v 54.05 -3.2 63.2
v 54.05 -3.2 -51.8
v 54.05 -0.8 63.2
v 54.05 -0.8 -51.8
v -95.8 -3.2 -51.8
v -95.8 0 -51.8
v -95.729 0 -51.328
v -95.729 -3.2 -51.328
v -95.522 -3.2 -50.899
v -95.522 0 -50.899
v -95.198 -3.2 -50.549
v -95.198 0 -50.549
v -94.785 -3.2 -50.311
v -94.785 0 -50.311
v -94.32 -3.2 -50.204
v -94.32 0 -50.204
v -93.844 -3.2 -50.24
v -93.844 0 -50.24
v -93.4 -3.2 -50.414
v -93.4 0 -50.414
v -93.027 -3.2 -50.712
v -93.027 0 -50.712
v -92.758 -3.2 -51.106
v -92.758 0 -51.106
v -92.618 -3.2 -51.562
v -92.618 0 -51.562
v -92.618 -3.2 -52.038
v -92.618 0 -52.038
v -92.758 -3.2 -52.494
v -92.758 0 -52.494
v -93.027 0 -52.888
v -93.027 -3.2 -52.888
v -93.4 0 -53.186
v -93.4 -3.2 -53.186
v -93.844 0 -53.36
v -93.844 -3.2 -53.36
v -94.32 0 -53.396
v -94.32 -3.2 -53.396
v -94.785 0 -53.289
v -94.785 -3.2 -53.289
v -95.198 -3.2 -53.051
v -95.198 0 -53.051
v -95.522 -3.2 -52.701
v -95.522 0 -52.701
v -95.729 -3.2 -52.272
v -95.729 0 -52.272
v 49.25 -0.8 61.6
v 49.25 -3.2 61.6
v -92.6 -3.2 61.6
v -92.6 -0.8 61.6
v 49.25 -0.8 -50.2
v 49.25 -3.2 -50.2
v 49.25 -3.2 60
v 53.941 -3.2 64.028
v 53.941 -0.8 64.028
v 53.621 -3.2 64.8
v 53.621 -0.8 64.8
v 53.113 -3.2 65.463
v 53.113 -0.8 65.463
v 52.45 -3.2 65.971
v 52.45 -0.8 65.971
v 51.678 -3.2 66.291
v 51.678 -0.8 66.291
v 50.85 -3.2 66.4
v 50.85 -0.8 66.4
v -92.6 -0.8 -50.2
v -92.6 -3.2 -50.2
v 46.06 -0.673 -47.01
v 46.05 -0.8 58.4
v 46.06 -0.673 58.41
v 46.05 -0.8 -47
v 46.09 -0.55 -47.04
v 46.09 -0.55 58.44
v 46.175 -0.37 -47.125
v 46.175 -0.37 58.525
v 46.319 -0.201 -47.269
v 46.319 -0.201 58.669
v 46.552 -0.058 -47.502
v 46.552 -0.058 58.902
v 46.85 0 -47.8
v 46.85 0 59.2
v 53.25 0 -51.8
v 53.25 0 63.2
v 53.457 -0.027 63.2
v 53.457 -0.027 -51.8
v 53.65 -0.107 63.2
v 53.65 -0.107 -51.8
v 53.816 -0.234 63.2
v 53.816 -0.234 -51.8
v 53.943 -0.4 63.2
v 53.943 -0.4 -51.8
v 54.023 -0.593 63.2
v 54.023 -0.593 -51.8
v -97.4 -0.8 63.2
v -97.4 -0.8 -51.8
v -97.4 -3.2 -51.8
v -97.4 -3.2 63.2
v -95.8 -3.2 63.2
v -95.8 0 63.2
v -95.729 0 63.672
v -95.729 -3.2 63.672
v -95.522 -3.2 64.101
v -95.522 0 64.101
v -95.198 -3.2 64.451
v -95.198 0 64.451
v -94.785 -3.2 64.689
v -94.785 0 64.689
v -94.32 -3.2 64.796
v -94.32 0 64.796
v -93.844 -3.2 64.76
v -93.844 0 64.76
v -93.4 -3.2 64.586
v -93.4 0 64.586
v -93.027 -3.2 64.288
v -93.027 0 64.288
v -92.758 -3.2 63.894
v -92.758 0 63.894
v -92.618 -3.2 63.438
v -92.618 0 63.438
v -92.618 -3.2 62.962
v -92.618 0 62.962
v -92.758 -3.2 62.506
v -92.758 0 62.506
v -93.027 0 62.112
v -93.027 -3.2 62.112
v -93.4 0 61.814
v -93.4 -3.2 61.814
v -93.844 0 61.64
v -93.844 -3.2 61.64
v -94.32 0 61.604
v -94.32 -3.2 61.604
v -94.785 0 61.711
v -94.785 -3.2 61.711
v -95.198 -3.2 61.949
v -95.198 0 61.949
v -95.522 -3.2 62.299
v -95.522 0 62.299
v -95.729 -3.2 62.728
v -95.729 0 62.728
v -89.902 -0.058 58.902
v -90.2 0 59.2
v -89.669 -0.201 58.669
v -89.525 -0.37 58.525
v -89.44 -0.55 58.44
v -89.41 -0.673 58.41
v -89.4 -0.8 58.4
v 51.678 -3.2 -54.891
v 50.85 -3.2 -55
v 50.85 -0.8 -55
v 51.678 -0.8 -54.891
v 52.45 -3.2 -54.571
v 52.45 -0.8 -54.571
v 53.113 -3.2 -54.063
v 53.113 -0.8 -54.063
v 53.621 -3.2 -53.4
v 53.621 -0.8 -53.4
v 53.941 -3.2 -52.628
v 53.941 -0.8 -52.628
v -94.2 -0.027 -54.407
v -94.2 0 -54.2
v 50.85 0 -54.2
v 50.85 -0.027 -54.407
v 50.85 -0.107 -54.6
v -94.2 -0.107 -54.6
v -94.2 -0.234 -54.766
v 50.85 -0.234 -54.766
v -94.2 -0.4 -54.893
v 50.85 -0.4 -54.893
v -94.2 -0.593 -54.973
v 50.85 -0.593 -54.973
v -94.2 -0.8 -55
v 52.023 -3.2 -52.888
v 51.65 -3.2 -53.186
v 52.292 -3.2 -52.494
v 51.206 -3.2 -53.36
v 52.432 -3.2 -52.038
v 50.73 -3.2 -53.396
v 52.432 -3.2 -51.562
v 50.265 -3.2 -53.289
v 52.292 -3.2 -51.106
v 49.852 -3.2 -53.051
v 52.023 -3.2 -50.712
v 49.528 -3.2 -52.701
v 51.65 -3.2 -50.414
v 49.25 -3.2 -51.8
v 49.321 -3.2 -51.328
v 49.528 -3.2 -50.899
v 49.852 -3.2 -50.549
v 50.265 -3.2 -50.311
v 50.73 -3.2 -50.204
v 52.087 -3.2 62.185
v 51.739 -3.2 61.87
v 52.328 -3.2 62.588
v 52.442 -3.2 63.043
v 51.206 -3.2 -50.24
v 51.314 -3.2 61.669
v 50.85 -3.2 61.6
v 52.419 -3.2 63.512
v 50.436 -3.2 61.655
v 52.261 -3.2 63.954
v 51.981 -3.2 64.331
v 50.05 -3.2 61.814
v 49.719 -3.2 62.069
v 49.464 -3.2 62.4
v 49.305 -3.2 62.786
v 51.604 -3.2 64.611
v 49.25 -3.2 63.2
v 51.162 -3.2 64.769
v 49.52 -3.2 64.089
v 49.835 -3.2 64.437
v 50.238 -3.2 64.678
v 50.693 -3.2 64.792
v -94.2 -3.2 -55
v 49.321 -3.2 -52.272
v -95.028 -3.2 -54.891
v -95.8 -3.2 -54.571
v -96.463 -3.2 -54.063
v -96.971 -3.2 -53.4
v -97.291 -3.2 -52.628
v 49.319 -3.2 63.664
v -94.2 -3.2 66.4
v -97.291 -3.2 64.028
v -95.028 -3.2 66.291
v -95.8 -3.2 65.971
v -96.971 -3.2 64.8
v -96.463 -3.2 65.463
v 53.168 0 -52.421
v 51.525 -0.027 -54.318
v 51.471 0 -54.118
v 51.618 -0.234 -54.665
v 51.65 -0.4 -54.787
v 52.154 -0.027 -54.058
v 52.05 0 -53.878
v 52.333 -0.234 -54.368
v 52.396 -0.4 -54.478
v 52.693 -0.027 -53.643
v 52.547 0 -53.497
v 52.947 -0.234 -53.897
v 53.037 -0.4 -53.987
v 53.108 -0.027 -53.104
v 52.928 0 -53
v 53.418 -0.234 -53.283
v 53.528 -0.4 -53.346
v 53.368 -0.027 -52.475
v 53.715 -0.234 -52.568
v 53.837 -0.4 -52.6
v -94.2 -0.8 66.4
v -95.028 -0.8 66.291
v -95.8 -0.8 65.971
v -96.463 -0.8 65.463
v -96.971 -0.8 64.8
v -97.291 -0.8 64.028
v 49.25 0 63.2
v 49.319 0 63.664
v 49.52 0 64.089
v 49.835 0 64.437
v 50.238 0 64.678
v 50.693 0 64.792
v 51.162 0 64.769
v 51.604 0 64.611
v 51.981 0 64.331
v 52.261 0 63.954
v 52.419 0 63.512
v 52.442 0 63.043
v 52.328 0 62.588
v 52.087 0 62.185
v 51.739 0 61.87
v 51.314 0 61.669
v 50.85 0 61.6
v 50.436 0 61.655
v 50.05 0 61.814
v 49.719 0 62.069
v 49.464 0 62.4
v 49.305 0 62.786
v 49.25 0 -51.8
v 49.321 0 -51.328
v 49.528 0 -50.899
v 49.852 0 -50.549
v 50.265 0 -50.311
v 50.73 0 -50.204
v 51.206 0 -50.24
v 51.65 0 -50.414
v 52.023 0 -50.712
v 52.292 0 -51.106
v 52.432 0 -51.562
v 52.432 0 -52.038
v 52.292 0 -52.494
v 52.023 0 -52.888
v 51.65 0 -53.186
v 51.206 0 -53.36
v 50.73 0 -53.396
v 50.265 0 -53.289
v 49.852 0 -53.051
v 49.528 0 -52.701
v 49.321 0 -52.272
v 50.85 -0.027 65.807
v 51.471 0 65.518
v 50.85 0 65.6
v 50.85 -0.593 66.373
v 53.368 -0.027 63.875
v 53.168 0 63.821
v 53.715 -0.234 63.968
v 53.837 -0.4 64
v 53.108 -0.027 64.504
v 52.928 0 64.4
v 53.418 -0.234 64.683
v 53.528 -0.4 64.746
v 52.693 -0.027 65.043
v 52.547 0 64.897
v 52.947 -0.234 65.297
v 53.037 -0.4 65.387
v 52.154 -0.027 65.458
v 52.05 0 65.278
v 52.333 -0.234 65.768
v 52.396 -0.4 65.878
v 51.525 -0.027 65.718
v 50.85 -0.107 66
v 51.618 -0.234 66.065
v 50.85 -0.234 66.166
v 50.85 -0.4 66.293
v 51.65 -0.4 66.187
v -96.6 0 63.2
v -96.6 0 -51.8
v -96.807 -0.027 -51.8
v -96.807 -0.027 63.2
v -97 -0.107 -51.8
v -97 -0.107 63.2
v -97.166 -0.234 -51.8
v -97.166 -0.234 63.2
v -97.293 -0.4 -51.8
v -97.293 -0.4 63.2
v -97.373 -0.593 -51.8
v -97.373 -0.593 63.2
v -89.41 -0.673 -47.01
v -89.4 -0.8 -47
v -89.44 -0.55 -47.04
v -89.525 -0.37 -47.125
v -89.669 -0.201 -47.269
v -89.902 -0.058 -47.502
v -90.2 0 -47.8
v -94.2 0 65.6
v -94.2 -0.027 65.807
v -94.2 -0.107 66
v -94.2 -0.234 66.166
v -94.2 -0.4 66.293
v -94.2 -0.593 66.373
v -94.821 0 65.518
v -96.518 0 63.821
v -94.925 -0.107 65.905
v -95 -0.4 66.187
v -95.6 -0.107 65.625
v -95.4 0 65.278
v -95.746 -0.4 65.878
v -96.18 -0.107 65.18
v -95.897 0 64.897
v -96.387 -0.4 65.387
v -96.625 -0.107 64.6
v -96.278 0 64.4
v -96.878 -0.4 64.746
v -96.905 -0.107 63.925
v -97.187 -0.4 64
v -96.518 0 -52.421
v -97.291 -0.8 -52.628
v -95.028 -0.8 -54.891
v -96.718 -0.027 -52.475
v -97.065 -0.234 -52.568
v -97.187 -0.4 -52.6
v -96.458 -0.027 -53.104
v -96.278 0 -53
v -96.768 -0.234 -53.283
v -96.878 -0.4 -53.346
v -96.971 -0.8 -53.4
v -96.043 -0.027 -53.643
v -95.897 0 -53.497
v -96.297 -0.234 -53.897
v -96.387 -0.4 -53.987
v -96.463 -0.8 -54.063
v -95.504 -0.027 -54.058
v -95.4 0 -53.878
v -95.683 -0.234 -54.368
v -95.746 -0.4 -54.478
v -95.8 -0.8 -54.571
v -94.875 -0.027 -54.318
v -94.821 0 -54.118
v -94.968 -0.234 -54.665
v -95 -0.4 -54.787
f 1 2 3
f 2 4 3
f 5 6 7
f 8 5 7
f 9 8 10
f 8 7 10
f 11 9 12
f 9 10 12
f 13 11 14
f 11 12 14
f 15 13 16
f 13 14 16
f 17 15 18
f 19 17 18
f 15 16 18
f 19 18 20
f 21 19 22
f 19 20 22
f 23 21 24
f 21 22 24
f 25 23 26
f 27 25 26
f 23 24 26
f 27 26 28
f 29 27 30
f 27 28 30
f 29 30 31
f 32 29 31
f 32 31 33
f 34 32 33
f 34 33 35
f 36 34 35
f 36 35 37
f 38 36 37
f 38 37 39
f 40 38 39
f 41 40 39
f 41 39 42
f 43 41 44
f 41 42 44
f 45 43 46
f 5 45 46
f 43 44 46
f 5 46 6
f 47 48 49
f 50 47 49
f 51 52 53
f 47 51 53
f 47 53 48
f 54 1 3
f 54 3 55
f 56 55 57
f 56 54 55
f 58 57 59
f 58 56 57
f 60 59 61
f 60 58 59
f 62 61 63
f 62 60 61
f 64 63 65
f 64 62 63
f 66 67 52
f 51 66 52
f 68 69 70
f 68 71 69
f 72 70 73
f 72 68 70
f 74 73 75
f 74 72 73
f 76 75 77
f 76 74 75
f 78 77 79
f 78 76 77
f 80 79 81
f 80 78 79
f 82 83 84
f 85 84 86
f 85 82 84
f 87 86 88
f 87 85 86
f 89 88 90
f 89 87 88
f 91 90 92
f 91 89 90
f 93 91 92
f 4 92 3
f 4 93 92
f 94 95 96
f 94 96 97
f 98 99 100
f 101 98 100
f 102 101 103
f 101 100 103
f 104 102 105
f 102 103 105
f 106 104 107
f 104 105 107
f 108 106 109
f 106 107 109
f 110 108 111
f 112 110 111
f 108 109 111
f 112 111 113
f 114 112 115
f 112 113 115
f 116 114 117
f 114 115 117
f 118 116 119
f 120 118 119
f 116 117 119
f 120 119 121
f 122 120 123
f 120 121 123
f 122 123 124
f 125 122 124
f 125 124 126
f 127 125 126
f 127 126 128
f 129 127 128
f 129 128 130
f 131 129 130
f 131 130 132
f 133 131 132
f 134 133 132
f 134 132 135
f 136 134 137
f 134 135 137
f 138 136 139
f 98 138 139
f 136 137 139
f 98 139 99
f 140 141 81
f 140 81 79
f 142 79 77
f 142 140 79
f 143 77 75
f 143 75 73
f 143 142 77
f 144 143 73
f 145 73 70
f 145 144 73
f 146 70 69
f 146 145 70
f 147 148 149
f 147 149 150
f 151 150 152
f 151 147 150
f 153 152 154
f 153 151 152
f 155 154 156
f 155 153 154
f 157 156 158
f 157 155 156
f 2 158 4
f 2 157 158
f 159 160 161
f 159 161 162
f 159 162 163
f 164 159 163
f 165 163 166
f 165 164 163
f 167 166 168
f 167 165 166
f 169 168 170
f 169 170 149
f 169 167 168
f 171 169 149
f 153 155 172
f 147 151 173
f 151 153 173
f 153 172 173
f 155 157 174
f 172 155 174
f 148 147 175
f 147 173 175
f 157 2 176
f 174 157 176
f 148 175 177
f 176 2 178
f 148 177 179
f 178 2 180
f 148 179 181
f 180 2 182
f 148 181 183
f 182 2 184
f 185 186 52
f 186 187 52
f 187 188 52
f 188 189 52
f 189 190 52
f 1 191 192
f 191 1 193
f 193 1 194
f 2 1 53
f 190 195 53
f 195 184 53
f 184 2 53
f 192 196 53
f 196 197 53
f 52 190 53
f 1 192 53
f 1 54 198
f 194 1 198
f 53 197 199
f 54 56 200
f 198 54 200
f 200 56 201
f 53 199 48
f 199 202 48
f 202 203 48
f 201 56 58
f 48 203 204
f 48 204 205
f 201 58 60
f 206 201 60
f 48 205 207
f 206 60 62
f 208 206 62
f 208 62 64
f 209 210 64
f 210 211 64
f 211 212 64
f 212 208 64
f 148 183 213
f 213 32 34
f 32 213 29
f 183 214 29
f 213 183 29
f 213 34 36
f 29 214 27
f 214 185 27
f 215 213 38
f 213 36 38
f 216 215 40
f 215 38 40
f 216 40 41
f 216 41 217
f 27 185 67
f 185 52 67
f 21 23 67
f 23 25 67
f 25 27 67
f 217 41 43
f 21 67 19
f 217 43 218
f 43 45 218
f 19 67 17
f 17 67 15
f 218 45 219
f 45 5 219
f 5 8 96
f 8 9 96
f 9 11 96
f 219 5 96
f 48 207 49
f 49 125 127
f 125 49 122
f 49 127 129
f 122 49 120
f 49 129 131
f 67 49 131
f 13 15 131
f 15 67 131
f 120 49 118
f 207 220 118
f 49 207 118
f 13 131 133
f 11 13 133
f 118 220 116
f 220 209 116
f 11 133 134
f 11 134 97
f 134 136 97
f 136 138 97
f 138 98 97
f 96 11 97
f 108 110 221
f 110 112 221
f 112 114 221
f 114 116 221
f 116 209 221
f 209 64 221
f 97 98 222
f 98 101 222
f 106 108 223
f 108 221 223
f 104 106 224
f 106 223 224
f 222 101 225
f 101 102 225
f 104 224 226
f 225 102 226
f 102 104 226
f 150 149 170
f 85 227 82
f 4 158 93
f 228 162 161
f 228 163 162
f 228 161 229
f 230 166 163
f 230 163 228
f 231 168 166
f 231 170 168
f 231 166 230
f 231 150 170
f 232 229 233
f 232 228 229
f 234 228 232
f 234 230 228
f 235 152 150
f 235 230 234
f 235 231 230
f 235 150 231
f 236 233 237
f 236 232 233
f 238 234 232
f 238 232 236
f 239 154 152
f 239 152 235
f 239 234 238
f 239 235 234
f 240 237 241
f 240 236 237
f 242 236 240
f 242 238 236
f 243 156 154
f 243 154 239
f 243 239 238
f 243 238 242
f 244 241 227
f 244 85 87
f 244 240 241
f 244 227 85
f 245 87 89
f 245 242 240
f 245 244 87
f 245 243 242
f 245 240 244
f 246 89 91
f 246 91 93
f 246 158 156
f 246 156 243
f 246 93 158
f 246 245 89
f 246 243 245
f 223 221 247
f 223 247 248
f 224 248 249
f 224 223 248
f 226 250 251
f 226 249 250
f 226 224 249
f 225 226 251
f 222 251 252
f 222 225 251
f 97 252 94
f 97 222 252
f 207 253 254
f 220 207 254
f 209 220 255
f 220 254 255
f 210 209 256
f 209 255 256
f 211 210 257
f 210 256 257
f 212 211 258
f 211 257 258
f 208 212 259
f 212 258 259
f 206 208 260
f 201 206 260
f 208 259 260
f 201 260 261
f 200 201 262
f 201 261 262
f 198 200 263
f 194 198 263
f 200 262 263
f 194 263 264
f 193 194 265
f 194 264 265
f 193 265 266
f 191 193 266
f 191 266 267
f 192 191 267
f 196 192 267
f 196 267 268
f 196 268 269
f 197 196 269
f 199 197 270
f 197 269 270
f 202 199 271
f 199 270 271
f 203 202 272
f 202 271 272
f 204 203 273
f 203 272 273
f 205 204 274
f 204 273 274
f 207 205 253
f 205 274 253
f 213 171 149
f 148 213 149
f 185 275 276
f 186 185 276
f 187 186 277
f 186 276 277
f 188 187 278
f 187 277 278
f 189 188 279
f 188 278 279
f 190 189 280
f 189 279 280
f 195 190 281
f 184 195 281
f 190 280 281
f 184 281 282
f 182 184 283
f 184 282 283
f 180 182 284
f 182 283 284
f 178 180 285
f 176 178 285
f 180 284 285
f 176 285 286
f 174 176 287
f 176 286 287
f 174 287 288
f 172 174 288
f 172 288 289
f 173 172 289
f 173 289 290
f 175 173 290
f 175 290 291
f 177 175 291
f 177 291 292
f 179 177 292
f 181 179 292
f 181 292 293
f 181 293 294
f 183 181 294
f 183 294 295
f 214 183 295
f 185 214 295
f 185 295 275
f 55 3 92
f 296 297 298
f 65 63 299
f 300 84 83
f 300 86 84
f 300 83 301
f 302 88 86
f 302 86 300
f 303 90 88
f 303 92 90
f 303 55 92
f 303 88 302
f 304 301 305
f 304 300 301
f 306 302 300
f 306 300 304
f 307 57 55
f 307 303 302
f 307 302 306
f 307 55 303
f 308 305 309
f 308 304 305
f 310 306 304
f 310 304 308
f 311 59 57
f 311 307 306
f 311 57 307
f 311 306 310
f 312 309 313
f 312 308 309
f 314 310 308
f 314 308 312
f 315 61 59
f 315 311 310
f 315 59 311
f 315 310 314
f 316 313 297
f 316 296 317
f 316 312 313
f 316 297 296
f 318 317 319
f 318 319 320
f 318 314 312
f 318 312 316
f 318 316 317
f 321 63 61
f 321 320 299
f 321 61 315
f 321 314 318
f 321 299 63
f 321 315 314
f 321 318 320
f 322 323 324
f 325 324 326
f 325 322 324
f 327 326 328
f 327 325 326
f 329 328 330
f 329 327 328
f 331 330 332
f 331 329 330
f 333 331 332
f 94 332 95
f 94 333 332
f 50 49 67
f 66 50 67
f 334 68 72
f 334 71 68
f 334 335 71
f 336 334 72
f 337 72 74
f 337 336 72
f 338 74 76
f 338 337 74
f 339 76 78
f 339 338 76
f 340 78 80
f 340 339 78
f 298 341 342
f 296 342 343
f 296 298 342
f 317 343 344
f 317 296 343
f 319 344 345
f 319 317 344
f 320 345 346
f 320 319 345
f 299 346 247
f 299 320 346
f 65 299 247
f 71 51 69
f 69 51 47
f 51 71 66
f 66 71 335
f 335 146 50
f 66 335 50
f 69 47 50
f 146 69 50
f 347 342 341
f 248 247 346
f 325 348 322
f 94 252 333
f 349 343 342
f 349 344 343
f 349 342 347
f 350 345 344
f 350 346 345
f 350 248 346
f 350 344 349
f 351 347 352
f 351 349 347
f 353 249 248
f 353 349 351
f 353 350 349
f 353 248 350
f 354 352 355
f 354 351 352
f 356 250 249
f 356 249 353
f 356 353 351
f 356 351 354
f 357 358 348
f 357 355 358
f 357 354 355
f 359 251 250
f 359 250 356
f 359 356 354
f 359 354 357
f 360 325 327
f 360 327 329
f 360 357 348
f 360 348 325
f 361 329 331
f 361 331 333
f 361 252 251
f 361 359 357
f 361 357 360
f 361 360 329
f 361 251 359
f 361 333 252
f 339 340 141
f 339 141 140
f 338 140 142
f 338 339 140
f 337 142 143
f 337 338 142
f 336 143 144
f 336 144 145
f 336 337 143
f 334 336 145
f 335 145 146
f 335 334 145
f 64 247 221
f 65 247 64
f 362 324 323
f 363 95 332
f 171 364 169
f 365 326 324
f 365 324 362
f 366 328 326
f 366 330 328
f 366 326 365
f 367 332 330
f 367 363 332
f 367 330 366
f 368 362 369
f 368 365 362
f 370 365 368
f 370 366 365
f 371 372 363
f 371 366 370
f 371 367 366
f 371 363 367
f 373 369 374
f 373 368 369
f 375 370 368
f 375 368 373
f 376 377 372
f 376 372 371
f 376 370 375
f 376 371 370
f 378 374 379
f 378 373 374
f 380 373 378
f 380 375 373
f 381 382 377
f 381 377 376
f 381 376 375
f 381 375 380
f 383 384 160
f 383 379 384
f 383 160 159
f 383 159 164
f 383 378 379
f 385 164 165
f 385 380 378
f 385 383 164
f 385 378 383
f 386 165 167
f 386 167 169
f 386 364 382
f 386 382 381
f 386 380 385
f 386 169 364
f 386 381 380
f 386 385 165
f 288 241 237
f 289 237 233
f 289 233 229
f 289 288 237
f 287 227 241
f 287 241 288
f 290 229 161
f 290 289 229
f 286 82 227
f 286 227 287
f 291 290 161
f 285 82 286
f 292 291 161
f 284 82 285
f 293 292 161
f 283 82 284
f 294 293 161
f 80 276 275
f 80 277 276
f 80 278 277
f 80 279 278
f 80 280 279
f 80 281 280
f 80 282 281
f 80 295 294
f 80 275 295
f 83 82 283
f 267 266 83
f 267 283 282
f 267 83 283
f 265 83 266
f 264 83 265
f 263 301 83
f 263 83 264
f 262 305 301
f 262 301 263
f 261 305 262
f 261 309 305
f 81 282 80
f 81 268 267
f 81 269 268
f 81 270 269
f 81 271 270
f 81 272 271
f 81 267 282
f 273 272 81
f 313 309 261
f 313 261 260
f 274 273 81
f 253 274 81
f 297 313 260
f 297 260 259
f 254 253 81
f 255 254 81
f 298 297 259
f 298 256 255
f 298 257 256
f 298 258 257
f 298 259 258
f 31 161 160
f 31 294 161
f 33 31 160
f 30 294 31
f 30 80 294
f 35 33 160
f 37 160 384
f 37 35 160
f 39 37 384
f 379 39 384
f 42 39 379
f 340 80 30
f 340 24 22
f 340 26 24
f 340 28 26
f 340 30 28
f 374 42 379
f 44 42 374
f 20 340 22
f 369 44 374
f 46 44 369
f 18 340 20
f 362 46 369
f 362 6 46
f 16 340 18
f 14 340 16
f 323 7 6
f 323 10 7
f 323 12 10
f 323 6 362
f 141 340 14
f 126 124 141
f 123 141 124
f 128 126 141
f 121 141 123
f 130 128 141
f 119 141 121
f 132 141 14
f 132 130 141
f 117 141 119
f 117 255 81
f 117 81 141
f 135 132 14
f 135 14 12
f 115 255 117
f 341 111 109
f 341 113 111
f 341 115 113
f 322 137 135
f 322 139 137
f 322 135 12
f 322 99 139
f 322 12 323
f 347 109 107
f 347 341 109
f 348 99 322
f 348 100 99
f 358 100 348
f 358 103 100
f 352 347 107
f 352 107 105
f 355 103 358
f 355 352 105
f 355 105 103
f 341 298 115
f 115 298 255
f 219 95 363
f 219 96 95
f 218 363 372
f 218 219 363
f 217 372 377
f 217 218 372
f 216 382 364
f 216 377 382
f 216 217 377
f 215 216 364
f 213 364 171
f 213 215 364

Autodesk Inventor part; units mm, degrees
ref_plane "YZ Plane" through (0, 0, 0) normal (1, 0, 0) x (0, 1, 0)
ref_plane "XZ Plane" through (0, 0, 0) normal (0, 1, 0) x (-1, 0, 0)
ref_plane "XY Plane" through (0, 0, 0) normal (0, 0, 1) x (1, 0, 0)
sketch "Sketch1" plane through (0, 0, 0) normal (0, 1, 0) x (-1, 0, 0)
  line L0 (0, 0) -> (61, 0)
  circle A0 centre (0, 0) radius 33.6
  circle A1 centre (61, 0) radius 8.5
  line L1 (69.5, 0) -> (69.5, 7.5)
  line L2 (69.5, 7.5) -> (69.5, -7.5)
  line L3 (69.5, -7.5) -> (65, -7.5)
  line L4 (69.5, 7.5) -> (65, 7.5)
  line L5 (69.5, 7.5) -> (72.5, 7.5)
  line L6 (72.5, 7.5) -> (72.5, -7.5)
  line L7 (72.5, -7.5) -> (69.5, -7.5)
  line L8 (52.5, 0) -> (47.5, 0)
  line L9 (61, 8.5) -> (61, 13.5)
  line L10 (72.5, 0) -> (77.5, 0)
  line L11 (61, -8.5) -> (61, -13.5)
  line L12 (47.95, 13.05) -> (77.05, 13.05)
  line L13 (77.05, 13.05) -> (77.05, -13.05)
  line L14 (77.05, -13.05) -> (47.95, -13.05)
  line L15 (47.95, -13.05) -> (47.95, 13.05)
  line L16 (72.5, 7.5) -> (72.5, 10.5)
  line L17 (72.5, 10.5) -> (65, 10.5)
  line L18 (65, 10.5) -> (65, 7.5)
  line L19 (72.5, -7.5) -> (72.5, -10.5)
  line L20 (72.5, -10.5) -> (65, -10.5)
  line L21 (65, -10.5) -> (65, -7.5)
  line L22 (61, 0) -> (61, 60)
  line L23 (0, 0) -> (-42.65, 0)
  line L24 (-42.65, 0) -> (-47.65, 0)
  line L25 (0, 0) -> (0, -33.6)
  line L26 (0, 0) -> (42.65, 0)
  line L27 (42.65, 0) -> (42.65, 60)
  line L28 (42.65, 0) -> (42.65, -33.6)
  circle A2 centre (61, 0) radius 25
  line L29 (42.65, 25) -> (42.65, 31.2)
  line L30 (42.65, 31.2) -> (48.85, 31.2)
  line L31 (42.65, -25) -> (42.65, -31.2)
  line L32 (36, 0) -> (31, 0)
  line L33 (31, 0) -> (31, -31.2)
  line L34 (31, -31.2) -> (31, -37.4)
  line L35 (31, -37.4) -> (79.35, -37.4)
  line L36 (79.35, -37.4) -> (79.35, 31.2)
  line L37 (79.35, 31.2) -> (79.35, 37.4)
  line L38 (79.35, 37.4) -> (31, 37.4)
  line L39 (31, 37.4) -> (31, 0)
  line L40 (42.65, -33.6) -> (42.65, -37.4)
  circle A3 centre (61, 0) radius 5.25
  line L41 (86, 0) -> (91, 0)
  line L42 (91, 0) -> (97.4, 0)
  line L43 (-47.65, 0) -> (-47.65, 60)
  line L44 (-47.65, 60) -> (42.65, 60)
  line L45 (91, 0) -> (91, 60)
  line L46 (91, 60) -> (42.65, 60)
  line L47 (0, -33.6) -> (0, -43.6)
  line L48 (0, -43.6) -> (0, -48.6)
  line L49 (0, -48.6) -> (0, -55)
  line L50 (0, -55) -> (-54.05, -55)
  line L51 (0, -48.6) -> (-47.65, -48.6)
  line L52 (-47.65, -48.6) -> (-47.65, 0)
  line L53 (0, -55) -> (97.4, -55)
  line L54 (97.4, -55) -> (97.4, 0)
  line L55 (91, 0) -> (91, -48.6)
  line L56 (91, -48.6) -> (0, -48.6)
  line L57 (0, -48.6) -> (10, -48.6)
  line L58 (0, -48.6) -> (-10, -48.6)
  line L59 (10, -48.6) -> (10, -55)
  line L60 (-10, -48.6) -> (-10, -55)
  line L61 (10, -48.6) -> (10, -43.6)
  line L62 (10, -43.6) -> (-10, -43.6)
  line L63 (-10, -43.6) -> (-10, -49.0563)
  line L64 (65, 10.5) -> (66, 10.5)
  line L65 (66, 10.5) -> (66, 7.5)
  line L66 (65, -10.5) -> (66, -10.5)
  line L67 (66, -10.5) -> (66, -7.5)
  line L68 (-47.65, 0) -> (-54.05, 0)
  line L69 (42.65, 60) -> (42.65, 66.4)
  line L70 (-54.05, -55) -> (-54.05, 0)
  line L71 (-54.05, 66.4) -> (-54.05, 0)
  line L72 (42.65, 66.4) -> (-54.05, 66.4)
  line L73 (97.4, 0) -> (97.4, 66.4)
  line L74 (97.4, 66.4) -> (42.65, 66.4)
  line L75 (-47.65, 60) -> (-50.85, 60)
  line L76 (-50.85, 60) -> (-50.85, 63.2)
  circle A4 centre (-50.85, 63.2) radius 1.6
  line L77 (91, 60) -> (94.2, 60)
  line L78 (94.2, 60) -> (-50.85, 60)
  circle A5 centre (-32.7188, 63.2) radius 1.6
  circle A6 centre (-14.5875, 63.2) radius 1.6
  circle A7 centre (3.5438, 63.2) radius 1.6
  circle A8 centre (21.675, 63.2) radius 1.6
  circle A9 centre (39.8063, 63.2) radius 1.6
  circle A10 centre (57.9375, 63.2) radius 1.6
  circle A11 centre (76.0688, 63.2) radius 1.6
  circle A12 centre (94.2, 63.2) radius 1.6
  line L79 (-47.65, 60) -> (-47.65, 63.2)
  line L80 (-47.65, 63.2) -> (-47.65, -51.8)
  circle A13 centre (-50.85, 44.0333) radius 1.6
  circle A14 centre (-50.85, 24.8667) radius 1.6
  circle A15 centre (-50.85, 5.7) radius 1.6
  circle A16 centre (-50.85, -13.4667) radius 1.6
  circle A17 centre (-50.85, -32.6333) radius 1.6
  circle A18 centre (-50.85, -51.8) radius 1.6
  line L81 (-47.65, 60) -> (21.675, 60)
  line L82 (21.675, 60) -> (21.675, 55.1722)
  line L83 (-47.65, 5.7) -> (-45.15, 5.7)
  circle A19 centre (-50.85, -51.8) radius 1.6
  circle A20 centre (-32.7188, -51.8) radius 1.6
  circle A21 centre (-14.5875, -51.8) radius 1.6
  circle A22 centre (3.5438, -51.8) radius 1.6
  circle A23 centre (21.675, -51.8) radius 1.6
  circle A24 centre (39.8063, -51.8) radius 1.6
  circle A25 centre (57.9375, -51.8) radius 1.6
  circle A26 centre (76.0688, -51.8) radius 1.6
  circle A27 centre (94.2, -51.8) radius 1.6
  circle A28 centre (94.2, 44.0333) radius 1.6
  circle A29 centre (94.2, 24.8667) radius 1.6
  circle A30 centre (94.2, 5.7) radius 1.6
  circle A31 centre (94.2, -13.4667) radius 1.6
  circle A32 centre (94.2, -32.6333) radius 1.6
  line L84 (61, 60) -> (61, 56.8)
  line L85 (61, 56.8) -> (61, 38.8)
  line L86 (61, 56.8) -> (48.1, 56.8)
  line L87 (61, 56.8) -> (73.9, 56.8)
  line L88 (73.9, 56.8) -> (73.9, 38.8)
  line L89 (73.9, 38.8) -> (61, 38.8)
  line L90 (48.1, 56.8) -> (48.1, 38.8)
  line L91 (48.1, 38.8) -> (61, 38.8)
  line L92 (0, 60) -> (0, 56.8)
  line L93 (0, 56.8) -> (-16.65, 56.8)
  line L94 (-16.65, 56.8) -> (16.65, 56.8)
  line L95 (16.65, 56.8) -> (16.65, 38.6)
  line L96 (16.65, 38.6) -> (-16.65, 38.6)
  line L97 (-16.65, 38.6) -> (-16.65, 56.8)
  circle A33 centre (-50.85, 63.2) radius 1.4
  circle A34 centre (-32.7188, 63.2) radius 1.4
  circle A35 centre (-14.5875, 63.2) radius 1.4
  circle A36 centre (3.5438, 63.2) radius 1.4
  circle A37 centre (21.675, 63.2) radius 1.4
  circle A38 centre (39.8063, 63.2) radius 1.4
  circle A39 centre (57.9375, 63.2) radius 1.4
  circle A40 centre (76.0688, 63.2) radius 1.4
  circle A41 centre (94.2, 63.2) radius 1.4
  circle A42 centre (-50.85, -51.8) radius 1.4
  circle A43 centre (-32.7188, -51.8) radius 1.4
  circle A44 centre (-14.5875, -51.8) radius 1.4
  circle A45 centre (3.5438, -51.8) radius 1.4
  circle A46 centre (21.675, -51.8) radius 1.4
  circle A47 centre (39.8063, -51.8) radius 1.4
  circle A48 centre (57.9375, -51.8) radius 1.4
  circle A49 centre (76.0688, -51.8) radius 1.4
  circle A50 centre (94.2, -51.8) radius 1.4
  circle A51 centre (-50.85, 44.0333) radius 1.4
  circle A52 centre (-50.85, 24.8667) radius 1.4
  circle A53 centre (-50.85, 5.7) radius 1.4
  circle A54 centre (-50.85, -13.4667) radius 1.4
  circle A55 centre (-50.85, -32.6333) radius 1.4
  circle A56 centre (-50.85, -51.8) radius 1.4
  circle A57 centre (94.2, 63.2) radius 1.4
  circle A58 centre (94.2, 44.0333) radius 1.4
  circle A59 centre (94.2, 24.8667) radius 1.4
  circle A60 centre (94.2, 5.7) radius 1.4
  circle A61 centre (94.2, -13.4667) radius 1.4
  circle A62 centre (94.2, -32.6333) radius 1.4
  circle A63 centre (94.2, -51.8) radius 1.4
  line L98 (61, 8.5) -> (61, 6.7)
  line L99 (61, 6.7) -> (61.8, 6.7)
  line L100 (61, 6.7) -> (60.2, 6.7)
  line L101 (60.2, 6.7) -> (60.2, 8.4623)
  line L102 (61.8, 6.7) -> (61.8, 8.4623)
  line L103 (-16.65, 56.8) -> (-16.65, 60)
  line L104 (-16.65, 60) -> (-19.85, 60)
  line L105 (16.65, 38.6) -> (19.85, 38.6)
  line L106 (19.85, 38.6) -> (19.85, 35.4)
  line L107 (-19.85, 60) -> (19.85, 60)
  line L108 (19.85, 60) -> (19.85, 35.4)
  line L109 (19.85, 35.4) -> (-19.85, 35.4)
  line L110 (-19.85, 35.4) -> (-19.85, 60)
  line L111 (-16.65, 47.7) -> (8.35, 47.7)
  line L112 (16.65, 56.8) -> (19.85, 56.8)
  line L113 (16.65, 38.6) -> (19.85, 38.6)
  line L114 (8.35, 47.7) -> (8.35, 52.7)
  line L115 (8.35, 47.7) -> (8.35, 42.7)
  line L116 (8.35, 42.7) -> (-16.65, 42.7)
  line L117 (8.35, 52.7) -> (-16.65, 52.7)
  line L118 (79.35, -37.4) -> (82.55, -37.4)
  line L119 (82.55, -37.4) -> (82.55, 37.4)
  line L120 (82.55, 37.4) -> (79.35, 37.4)
  line L121 (48.85, 31.2) -> (45.65, 31.2)
  circle A64 centre (45.65, 31.2) radius 1.6
  circle A65 centre (45.65, 31.2) radius 1.4
  circle A66 centre (45.65, 31.2) radius 3.2
  circle A67 centre (76.35, 31.2) radius 1.6
  circle A68 centre (76.35, 31.2) radius 1.4
  circle A69 centre (76.35, 31.2) radius 3.2
  circle A70 centre (45.65, -31.2) radius 1.6
  circle A71 centre (45.65, -31.2) radius 1.4
  circle A72 centre (45.65, -31.2) radius 3.2
  circle A73 centre (76.35, -31.2) radius 3.2
  circle A74 centre (76.35, -31.2) radius 1.6
  circle A75 centre (76.35, -31.2) radius 1.4
  line L122 (91, -48.6) -> (92.6, -48.6)
  line L123 (92.6, -48.6) -> (92.6, -50.2)
  line L124 (-47.65, 60) -> (-49.25, 60)
  line L125 (-49.25, 60) -> (-49.25, 61.6)
  line L126 (-47.65, 60) -> (-46.05, 60)
  line L127 (-46.05, 60) -> (-46.05, 58.4)
  line L128 (91, -48.6) -> (89.4, -48.6)
  line L129 (89.4, -48.6) -> (89.4, -47)
  line L130 (89.4, -47) -> (-46.05, -47)
  line L131 (-46.05, -47) -> (-46.05, 58.4)
  line L132 (-46.05, 58.4) -> (89.4, 58.4)
  line L133 (89.4, 58.4) -> (89.4, -47)
  line L134 (-49.25, 61.6) -> (92.6, 61.6)
  line L135 (92.6, 61.6) -> (92.6, -50.2)
  line L136 (92.6, -50.2) -> (-49.25, -50.2)
  line L137 (-49.25, -50.2) -> (-49.25, 61.6)
  point P0 (42.65, 37.4)
  point P1 (31, -12.9599)
  point P2 (31, 12.9599)
  dimension "d1" = 67.2
  dimension "d2" = 17
  dimension "d0" = 61
  dimension "d3" = 7.5
  dimension "d4" = 15
  dimension "d5" = 3
  dimension "d6" = 5
  dimension "d7" = 5
  dimension "d8" = 5
  dimension "d9" = 5
  dimension "d10" = 3
  dimension "d11" = 60
  dimension "d13" = 42.65
  dimension "d14" = 5
  dimension "d16" = 50
  dimension "d17" = 6.2
  dimension "d18" = 6.2
  dimension "d19" = 6.2
  dimension "d26" = 5
  dimension "d27" = 6.2
  dimension "d31" = 10.5
  dimension "d33" = 5
  dimension "d34" = 6.4
  dimension "d36" = 10
  dimension "d37" = 5
  dimension "d38" = 6.4
  dimension "d41" = 10
  dimension "d42" = 10
  dimension "d52" = 1
  dimension "d53" = 1
  dimension "d56" = 6.4
  dimension "d57" = 6.4
  dimension "d58" = 3.2
  dimension "d59" = 3.2
  dimension "d62" = 18.1313
  dimension "d67" = 115
  dimension "d70" = 19.1667
  dimension "d78" = 3.2
  dimension "d79" = 18
  dimension "d80" = 12.9
  dimension "d81" = 12.9
  dimension "d82" = 3.2
  dimension "d83" = 16.65
  dimension "d84" = 33.3
  dimension "d85" = 18.2
  dimension "d93" = 2.8
  dimension "d96" = 18.1313
  dimension "d99" = 115
  dimension "d104" = 19.1667
  dimension "d107" = 145.05
  dimension "d110" = 1.8
  dimension "d111" = 0.8
  dimension "d112" = 0.8
  dimension "d115" = 3.2
  dimension "d116" = 3.2
  dimension "d117" = 3.2
  dimension "d118" = 3.2
  dimension "d119" = 25
  dimension "d120" = 5
  dimension "d121" = 5
  dimension "d127" = 3.2
  dimension "d128" = 3.2
  dimension "d129" = 2.8
  dimension "d130" = 6.4
  dimension "d137" = 1.6
  dimension "d138" = 1.6
extrude "backplate" add sketch "Sketch1" against normal blind 3.2 contours L131 L130 L63 L51 L52 L24 | L24 L43 L83 L131 | L130 L61 L56 L48 | L48 L51 L63 L130 | L68 L137 L75 L43 | L52 L80 L136 L137 L68 | L83 L43 L44 L127 L131 | L56 L59 L136 L49 | L49 L136 L60 L51 | L130 L129 L56 L61 | L132 L82 L44 L27 | L27 L46 L22 L132 | L51 L60 L136 L80 | A21 | A20 | A17 | A16 | L137 L136 L60 L50 L70 L68 | A15 | A14 | A13 | A33 | A4 | A5 | A6 | A7 | A8 | A9 | L68 L71 L72 L69 L134 L125 L137 | L127 L44 L110 L132 | A22 | L136 L59 L53 L49 | L49 L50 L60 L136 | L56 L122 L123 L136 L59 | L133 L41 L55 L56 L129 | L69 L134 L135 L77 L46 | L44 L79 L134 L69 | L132 L108 L44 L82 | L22 L46 L45 L41 L133 L132 | L75 L125 L134 L79 | L110 L44 L103 L132 | A31 | A32 | A26 | A25 | A24 | A23 | L136 L123 L135 L42 L54 L53 L59 | A10 | A11 | A28 | A29 | A30 | L69 L74 L73 L42 L135 L134 | L132 L92 L44 L108 | L103 L44 L92 L132 | L55 L42 L135 L122 | L45 L77 L135 L42 | A12 | A18 | A27 | A34 | A35 | A36 | A37 | A38 | A39 | A40 | A41 | A42 | A43 | A44 | A45 | A46 | A47 | A48 | A49 | A50 | A51 | A52 | A53 | A54 | A55 | A58 | A59 | A60 | A61 | A62
fillet "Fillet3" radius 3.2 4 edges at (54.05, -1.6, -55) (-97.4, -1.6, -55) (-97.4, -1.6, 66.4) (54.05, -1.6, 66.4)
extrude "B2 male pegs" cut sketch "Sketch1" against normal through all contours A33 | A4 | A12 | A18 | A27 | A41 | A42 | A50
fillet "Fillet8" radius 0.8 8 edges at (-96.4627, 0, -54.0627) (-97.4, 0, 5.7) (-96.4627, 0, 65.4627) (-21.675, 0, 66.4) (53.1127, 0, 65.4627) (54.05, 0, 5.7) (53.1127, 0, -54.0627) (-21.675, 0, -55)
extrude "Extrusion12" cut sketch "Sketch1" along normal blind 2.4 from surface at -3.2 contours L23 A0 L39 L0 | L25 A0 L23 | L0 L33 A0 L25 | L39 A0 L0 | L0 A0 L33 | L23 L24 L131 L132 L110 L109 L106 L108 L27 L38 L39 A0 | A0 L47 L62 L63 L130 L131 L24 L23 | A0 L33 L34 L35 L118 L119 A2 L41 L133 L130 L61 L62 L47 | A0 L39 L38 L27 A66 A2 L0 | L0 A2 L28 A72 L40 L35 L34 L33 A0 | L62 L61 L130 L48 | L48 L130 L63 L62 | A2 L27 L0 | L0 L28 A2 | L131 L130 L63 L51 L52 L24 | L24 L43 L83 L131 | L130 L61 L56 L48 | L48 L51 L63 L130 | L27 A2 L22 L9 L12 L15 L0 | L0 L15 L14 L13 L12 L9 L22 A2 L36 L28 | L27 A66 L38 L22 A2 | A2 L36 A73 L35 L40 L28 A72 | L27 L132 L22 L86 L90 L91 L38 | L68 L137 L75 L43 | L52 L80 L136 L137 L68 | L83 L43 L44 L127 L131 | L56 L59 L136 L49 | L49 L136 L60 L51 | L130 L129 L56 L61 | L22 L38 L37 A69 L36 A2 | L36 A2 L119 | A2 L119 L118 L36 A73 | A66 L30 A64 L27 | L27 A66 | L132 L82 L44 L27 | L27 L46 L22 L132 | L22 L89 L88 L87 L132 L133 L41 A2 L119 L120 L38 | L51 L60 L136 L80 | L127 L44 L110 L132 | L56 L122 L123 L136 L59 | L133 L41 L55 L56 L129 | L15 L12 L9 A1 L0 | L0 A1 L11 L14 L15 | L27 L30 A64 A66 | L36 A69 L37 L120 L119 A2 | A72 L28 | L28 A72 | L119 A2 | A73 L36 | L36 A73 | L69 L134 L135 L77 L46 | L44 L79 L134 L69 | L132 L108 L44 L82 | L22 L46 L45 L41 L133 L132 | L91 L90 L86 L22 | L22 L87 L88 L89 | L75 L125 L134 L79 | L132 L103 L97 L96 L105 L106 L109 L110 | L110 L44 L103 L132 | A1 L101 L100 L22 A3 L0 | L0 A3 L22 L99 L102 A1 | L12 L13 L10 L6 L16 L17 L18 A1 L9 | A69 L37 L36 | L36 L37 A69 | A64 L30 A65 | L30 A65 A64 | L132 L92 L44 L108 | L108 L112 L94 L92 L132 | L132 L92 L93 L103 | L103 L44 L92 L132 | L55 L42 L135 L122 | L45 L77 L135 L42 | A3 L22 L0 | L0 L22 A3 | A1 L22 L100 L101 | A1 L21 L20 L19 L6 L10 L13 L14 L11 | A1 L102 L99 L22 | A65 L30 | L30 A65 | L108 L105 L95 L112 | L93 L94 L95 L96 L97 L116 L115 L114 L117 | A1 L2 L3 | L3 L67 L20 L21 | L117 L114 L111 L97 | A1 L4 L1 | L1 L5 L6 L7 L2 | L3 L7 L19 L20 L67 | L18 L17 L65 L4 | L111 L115 L116 L97 | L4 L65 L17 L16 L5 | A67 | A68 | A70 | A71 | A74 | A75
fillet "Fillet10" radius 0.8 4 edges at (46.05, 0, 5.7) (-21.675, 0, 58.4) (-89.4, 0, 5.7) (-21.675, 0, -47)
properties part number "door top plate with window"
